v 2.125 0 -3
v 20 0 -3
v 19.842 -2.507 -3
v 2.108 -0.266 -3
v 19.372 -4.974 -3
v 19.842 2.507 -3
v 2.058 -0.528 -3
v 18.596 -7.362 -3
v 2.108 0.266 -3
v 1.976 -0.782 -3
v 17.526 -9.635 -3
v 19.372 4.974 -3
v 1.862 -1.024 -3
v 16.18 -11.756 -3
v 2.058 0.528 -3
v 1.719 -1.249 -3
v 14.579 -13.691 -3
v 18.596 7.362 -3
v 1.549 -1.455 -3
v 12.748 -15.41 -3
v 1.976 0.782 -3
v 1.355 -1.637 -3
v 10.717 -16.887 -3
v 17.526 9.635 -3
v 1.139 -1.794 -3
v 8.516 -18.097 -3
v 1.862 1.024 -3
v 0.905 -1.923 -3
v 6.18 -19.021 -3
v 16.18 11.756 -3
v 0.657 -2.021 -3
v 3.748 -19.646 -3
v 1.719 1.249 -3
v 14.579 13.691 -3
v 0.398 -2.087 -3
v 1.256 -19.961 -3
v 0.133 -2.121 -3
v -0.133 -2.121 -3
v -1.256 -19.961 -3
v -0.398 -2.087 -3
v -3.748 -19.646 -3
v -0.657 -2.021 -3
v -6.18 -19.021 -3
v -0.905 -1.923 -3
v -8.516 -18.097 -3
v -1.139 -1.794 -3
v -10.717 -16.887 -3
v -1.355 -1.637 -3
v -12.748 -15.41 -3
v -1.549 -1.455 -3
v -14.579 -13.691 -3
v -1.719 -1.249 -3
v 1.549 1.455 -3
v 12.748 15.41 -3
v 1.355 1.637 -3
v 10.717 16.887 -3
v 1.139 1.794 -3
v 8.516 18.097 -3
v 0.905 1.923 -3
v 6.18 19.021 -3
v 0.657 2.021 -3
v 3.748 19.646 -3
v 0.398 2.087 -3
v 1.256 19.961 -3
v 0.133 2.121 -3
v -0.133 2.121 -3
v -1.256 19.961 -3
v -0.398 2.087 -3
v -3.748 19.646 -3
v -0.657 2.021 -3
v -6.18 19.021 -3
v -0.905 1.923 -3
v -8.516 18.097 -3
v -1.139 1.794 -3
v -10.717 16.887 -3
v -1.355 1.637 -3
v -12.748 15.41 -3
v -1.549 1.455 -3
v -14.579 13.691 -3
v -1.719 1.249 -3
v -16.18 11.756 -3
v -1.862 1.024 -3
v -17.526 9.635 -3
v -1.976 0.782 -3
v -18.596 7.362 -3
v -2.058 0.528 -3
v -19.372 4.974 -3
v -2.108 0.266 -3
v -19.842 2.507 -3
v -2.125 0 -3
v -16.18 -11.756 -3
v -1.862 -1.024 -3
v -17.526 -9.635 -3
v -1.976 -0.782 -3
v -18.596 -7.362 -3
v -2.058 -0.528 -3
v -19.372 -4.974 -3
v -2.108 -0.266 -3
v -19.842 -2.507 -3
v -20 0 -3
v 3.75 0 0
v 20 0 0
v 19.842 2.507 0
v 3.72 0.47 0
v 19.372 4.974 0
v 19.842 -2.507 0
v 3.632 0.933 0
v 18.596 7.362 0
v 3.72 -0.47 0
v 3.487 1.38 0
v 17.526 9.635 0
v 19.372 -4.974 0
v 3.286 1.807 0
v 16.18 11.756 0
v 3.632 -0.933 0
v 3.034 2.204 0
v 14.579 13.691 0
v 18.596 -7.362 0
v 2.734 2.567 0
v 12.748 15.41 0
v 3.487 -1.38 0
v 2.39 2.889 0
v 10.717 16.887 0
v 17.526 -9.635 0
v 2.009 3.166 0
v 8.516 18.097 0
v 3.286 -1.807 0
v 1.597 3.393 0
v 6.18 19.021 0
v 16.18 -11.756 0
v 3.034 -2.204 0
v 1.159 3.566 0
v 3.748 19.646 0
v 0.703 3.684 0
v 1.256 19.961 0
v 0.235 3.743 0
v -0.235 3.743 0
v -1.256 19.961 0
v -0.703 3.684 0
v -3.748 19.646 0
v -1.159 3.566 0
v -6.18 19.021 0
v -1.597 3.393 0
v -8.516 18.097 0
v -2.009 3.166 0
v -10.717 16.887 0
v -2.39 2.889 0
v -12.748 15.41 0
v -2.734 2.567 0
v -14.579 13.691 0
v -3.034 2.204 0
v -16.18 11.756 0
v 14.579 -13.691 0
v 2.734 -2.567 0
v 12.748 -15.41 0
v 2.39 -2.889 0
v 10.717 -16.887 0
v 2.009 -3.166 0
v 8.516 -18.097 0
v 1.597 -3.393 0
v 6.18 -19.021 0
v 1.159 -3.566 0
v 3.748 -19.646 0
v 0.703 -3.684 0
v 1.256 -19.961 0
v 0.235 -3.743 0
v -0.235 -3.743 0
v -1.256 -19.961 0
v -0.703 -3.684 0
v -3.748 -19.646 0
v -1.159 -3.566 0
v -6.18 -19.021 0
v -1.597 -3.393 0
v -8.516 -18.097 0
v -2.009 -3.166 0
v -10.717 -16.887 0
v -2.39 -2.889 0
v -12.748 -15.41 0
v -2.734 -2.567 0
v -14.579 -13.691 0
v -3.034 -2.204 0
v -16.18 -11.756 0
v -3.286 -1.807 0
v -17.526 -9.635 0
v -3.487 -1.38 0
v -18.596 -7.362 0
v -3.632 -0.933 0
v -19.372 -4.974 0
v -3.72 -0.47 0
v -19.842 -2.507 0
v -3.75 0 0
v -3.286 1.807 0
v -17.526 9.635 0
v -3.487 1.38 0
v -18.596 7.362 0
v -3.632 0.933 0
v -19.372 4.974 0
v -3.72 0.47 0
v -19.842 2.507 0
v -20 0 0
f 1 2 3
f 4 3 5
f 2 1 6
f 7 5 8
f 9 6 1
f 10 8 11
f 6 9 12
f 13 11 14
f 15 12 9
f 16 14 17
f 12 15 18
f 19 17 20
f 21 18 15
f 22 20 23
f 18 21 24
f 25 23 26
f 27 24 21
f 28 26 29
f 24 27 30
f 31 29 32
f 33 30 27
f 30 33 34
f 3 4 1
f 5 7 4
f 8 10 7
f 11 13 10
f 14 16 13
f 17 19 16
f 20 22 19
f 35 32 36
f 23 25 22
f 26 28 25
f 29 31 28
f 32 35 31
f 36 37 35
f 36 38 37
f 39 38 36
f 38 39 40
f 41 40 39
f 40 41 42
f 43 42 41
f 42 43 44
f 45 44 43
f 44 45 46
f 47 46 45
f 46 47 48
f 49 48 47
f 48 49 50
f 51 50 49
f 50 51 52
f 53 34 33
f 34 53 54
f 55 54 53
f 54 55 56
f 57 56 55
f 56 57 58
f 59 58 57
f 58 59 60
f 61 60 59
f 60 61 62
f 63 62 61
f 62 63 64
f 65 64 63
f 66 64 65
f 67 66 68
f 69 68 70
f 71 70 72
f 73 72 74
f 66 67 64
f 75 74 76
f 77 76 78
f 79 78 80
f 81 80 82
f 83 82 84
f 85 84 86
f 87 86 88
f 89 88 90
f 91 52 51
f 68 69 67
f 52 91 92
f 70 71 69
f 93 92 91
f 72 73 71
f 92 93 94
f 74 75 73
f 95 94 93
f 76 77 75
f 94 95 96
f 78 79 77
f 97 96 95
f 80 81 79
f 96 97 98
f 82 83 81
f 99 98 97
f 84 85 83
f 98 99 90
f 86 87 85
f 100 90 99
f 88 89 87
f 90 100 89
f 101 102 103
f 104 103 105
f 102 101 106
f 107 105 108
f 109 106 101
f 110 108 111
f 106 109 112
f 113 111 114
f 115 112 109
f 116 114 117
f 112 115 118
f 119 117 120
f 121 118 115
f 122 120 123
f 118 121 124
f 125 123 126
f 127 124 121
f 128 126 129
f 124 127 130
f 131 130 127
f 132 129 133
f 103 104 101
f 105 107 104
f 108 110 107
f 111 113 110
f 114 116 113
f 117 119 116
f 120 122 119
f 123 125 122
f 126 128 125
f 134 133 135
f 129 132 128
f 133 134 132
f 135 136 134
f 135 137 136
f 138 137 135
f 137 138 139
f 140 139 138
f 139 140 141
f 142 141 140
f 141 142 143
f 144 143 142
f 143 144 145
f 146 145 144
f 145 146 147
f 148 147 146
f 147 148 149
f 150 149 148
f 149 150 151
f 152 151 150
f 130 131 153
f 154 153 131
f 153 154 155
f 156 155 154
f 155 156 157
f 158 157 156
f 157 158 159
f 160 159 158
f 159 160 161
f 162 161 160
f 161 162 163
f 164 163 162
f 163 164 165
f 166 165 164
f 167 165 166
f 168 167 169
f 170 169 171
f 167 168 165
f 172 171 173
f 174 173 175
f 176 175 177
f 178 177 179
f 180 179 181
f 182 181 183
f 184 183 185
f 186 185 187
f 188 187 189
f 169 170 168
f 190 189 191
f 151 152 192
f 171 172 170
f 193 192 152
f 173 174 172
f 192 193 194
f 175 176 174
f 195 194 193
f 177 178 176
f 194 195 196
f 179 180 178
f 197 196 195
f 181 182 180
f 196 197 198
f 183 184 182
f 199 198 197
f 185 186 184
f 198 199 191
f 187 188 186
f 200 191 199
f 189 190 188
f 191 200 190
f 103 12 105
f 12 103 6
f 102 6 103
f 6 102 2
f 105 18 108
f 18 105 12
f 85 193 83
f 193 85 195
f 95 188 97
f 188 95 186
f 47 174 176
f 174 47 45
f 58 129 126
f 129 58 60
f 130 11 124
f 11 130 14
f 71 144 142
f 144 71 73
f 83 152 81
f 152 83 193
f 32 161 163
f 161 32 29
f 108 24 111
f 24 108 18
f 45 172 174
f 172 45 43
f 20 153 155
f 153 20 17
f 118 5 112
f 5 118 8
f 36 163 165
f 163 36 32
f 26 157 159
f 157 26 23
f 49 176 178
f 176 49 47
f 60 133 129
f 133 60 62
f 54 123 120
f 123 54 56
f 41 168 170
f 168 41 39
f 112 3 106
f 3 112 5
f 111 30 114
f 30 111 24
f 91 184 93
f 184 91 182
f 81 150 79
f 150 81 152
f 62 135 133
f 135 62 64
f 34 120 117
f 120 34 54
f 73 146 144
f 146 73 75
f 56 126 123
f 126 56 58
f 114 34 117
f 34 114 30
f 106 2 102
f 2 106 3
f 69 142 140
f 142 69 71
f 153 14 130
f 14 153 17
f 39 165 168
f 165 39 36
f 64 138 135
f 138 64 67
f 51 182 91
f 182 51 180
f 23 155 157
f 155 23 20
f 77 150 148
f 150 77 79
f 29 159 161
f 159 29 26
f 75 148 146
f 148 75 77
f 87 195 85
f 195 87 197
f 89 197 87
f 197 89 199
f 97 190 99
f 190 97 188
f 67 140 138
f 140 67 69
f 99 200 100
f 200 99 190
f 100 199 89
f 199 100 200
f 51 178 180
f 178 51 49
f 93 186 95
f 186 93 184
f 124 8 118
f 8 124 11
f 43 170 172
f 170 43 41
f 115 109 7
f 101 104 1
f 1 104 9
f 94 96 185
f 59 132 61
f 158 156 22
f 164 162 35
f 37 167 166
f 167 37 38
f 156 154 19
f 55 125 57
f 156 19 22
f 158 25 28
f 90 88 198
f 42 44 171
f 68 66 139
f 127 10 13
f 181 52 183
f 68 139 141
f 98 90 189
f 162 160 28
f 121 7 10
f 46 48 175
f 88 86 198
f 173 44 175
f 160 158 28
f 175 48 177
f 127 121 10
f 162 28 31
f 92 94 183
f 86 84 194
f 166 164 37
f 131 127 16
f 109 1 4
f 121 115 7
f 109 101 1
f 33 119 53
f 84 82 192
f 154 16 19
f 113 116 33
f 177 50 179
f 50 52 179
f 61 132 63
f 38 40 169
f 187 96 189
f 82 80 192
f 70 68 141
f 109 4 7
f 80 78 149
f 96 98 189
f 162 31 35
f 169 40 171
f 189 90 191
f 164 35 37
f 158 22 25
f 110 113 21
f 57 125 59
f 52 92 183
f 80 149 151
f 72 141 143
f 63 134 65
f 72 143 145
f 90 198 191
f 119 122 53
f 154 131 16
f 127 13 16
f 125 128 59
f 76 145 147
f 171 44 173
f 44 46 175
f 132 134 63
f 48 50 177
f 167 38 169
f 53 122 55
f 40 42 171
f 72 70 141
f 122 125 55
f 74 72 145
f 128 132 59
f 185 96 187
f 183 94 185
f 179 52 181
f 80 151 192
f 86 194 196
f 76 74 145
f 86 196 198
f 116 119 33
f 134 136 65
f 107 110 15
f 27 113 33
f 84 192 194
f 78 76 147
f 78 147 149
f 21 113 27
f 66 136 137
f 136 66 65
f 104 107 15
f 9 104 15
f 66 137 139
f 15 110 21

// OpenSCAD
$fn = 50;


difference() {
	union() {
		translate(v = [0, 0, -3.0000000000]) {
			cylinder(h = 3, r = 10.0000000000);
		}
		translate(v = [0, 0, -3.0000000000]) {
			cylinder(h = 3, r = 20.0000000000);
		}
	}
	union() {
		translate(v = [0, 0, 0]) {
			rotate(a = [0, 0, 0]) {
				difference() {
					union() {
						#translate(v = [0, 0, -3.0000000000]) {
							cylinder(h = 3, r = 2.0000000000);
						}
						#translate(v = [0, 0, -3]) {
							cylinder(h = 3, r = 10.0000000000, r1 = 2.1250000000, r2 = 3.7500000000);
						}
						#translate(v = [0, 0, -3.0000000000]) {
							cylinder(h = 3, r = 2.1250000000);
						}
						#translate(v = [0, 0, -3.0000000000]) {
							cylinder(h = 3, r = 2.0000000000);
						}
					}
					union();
				}
			}
		}
	}
}
